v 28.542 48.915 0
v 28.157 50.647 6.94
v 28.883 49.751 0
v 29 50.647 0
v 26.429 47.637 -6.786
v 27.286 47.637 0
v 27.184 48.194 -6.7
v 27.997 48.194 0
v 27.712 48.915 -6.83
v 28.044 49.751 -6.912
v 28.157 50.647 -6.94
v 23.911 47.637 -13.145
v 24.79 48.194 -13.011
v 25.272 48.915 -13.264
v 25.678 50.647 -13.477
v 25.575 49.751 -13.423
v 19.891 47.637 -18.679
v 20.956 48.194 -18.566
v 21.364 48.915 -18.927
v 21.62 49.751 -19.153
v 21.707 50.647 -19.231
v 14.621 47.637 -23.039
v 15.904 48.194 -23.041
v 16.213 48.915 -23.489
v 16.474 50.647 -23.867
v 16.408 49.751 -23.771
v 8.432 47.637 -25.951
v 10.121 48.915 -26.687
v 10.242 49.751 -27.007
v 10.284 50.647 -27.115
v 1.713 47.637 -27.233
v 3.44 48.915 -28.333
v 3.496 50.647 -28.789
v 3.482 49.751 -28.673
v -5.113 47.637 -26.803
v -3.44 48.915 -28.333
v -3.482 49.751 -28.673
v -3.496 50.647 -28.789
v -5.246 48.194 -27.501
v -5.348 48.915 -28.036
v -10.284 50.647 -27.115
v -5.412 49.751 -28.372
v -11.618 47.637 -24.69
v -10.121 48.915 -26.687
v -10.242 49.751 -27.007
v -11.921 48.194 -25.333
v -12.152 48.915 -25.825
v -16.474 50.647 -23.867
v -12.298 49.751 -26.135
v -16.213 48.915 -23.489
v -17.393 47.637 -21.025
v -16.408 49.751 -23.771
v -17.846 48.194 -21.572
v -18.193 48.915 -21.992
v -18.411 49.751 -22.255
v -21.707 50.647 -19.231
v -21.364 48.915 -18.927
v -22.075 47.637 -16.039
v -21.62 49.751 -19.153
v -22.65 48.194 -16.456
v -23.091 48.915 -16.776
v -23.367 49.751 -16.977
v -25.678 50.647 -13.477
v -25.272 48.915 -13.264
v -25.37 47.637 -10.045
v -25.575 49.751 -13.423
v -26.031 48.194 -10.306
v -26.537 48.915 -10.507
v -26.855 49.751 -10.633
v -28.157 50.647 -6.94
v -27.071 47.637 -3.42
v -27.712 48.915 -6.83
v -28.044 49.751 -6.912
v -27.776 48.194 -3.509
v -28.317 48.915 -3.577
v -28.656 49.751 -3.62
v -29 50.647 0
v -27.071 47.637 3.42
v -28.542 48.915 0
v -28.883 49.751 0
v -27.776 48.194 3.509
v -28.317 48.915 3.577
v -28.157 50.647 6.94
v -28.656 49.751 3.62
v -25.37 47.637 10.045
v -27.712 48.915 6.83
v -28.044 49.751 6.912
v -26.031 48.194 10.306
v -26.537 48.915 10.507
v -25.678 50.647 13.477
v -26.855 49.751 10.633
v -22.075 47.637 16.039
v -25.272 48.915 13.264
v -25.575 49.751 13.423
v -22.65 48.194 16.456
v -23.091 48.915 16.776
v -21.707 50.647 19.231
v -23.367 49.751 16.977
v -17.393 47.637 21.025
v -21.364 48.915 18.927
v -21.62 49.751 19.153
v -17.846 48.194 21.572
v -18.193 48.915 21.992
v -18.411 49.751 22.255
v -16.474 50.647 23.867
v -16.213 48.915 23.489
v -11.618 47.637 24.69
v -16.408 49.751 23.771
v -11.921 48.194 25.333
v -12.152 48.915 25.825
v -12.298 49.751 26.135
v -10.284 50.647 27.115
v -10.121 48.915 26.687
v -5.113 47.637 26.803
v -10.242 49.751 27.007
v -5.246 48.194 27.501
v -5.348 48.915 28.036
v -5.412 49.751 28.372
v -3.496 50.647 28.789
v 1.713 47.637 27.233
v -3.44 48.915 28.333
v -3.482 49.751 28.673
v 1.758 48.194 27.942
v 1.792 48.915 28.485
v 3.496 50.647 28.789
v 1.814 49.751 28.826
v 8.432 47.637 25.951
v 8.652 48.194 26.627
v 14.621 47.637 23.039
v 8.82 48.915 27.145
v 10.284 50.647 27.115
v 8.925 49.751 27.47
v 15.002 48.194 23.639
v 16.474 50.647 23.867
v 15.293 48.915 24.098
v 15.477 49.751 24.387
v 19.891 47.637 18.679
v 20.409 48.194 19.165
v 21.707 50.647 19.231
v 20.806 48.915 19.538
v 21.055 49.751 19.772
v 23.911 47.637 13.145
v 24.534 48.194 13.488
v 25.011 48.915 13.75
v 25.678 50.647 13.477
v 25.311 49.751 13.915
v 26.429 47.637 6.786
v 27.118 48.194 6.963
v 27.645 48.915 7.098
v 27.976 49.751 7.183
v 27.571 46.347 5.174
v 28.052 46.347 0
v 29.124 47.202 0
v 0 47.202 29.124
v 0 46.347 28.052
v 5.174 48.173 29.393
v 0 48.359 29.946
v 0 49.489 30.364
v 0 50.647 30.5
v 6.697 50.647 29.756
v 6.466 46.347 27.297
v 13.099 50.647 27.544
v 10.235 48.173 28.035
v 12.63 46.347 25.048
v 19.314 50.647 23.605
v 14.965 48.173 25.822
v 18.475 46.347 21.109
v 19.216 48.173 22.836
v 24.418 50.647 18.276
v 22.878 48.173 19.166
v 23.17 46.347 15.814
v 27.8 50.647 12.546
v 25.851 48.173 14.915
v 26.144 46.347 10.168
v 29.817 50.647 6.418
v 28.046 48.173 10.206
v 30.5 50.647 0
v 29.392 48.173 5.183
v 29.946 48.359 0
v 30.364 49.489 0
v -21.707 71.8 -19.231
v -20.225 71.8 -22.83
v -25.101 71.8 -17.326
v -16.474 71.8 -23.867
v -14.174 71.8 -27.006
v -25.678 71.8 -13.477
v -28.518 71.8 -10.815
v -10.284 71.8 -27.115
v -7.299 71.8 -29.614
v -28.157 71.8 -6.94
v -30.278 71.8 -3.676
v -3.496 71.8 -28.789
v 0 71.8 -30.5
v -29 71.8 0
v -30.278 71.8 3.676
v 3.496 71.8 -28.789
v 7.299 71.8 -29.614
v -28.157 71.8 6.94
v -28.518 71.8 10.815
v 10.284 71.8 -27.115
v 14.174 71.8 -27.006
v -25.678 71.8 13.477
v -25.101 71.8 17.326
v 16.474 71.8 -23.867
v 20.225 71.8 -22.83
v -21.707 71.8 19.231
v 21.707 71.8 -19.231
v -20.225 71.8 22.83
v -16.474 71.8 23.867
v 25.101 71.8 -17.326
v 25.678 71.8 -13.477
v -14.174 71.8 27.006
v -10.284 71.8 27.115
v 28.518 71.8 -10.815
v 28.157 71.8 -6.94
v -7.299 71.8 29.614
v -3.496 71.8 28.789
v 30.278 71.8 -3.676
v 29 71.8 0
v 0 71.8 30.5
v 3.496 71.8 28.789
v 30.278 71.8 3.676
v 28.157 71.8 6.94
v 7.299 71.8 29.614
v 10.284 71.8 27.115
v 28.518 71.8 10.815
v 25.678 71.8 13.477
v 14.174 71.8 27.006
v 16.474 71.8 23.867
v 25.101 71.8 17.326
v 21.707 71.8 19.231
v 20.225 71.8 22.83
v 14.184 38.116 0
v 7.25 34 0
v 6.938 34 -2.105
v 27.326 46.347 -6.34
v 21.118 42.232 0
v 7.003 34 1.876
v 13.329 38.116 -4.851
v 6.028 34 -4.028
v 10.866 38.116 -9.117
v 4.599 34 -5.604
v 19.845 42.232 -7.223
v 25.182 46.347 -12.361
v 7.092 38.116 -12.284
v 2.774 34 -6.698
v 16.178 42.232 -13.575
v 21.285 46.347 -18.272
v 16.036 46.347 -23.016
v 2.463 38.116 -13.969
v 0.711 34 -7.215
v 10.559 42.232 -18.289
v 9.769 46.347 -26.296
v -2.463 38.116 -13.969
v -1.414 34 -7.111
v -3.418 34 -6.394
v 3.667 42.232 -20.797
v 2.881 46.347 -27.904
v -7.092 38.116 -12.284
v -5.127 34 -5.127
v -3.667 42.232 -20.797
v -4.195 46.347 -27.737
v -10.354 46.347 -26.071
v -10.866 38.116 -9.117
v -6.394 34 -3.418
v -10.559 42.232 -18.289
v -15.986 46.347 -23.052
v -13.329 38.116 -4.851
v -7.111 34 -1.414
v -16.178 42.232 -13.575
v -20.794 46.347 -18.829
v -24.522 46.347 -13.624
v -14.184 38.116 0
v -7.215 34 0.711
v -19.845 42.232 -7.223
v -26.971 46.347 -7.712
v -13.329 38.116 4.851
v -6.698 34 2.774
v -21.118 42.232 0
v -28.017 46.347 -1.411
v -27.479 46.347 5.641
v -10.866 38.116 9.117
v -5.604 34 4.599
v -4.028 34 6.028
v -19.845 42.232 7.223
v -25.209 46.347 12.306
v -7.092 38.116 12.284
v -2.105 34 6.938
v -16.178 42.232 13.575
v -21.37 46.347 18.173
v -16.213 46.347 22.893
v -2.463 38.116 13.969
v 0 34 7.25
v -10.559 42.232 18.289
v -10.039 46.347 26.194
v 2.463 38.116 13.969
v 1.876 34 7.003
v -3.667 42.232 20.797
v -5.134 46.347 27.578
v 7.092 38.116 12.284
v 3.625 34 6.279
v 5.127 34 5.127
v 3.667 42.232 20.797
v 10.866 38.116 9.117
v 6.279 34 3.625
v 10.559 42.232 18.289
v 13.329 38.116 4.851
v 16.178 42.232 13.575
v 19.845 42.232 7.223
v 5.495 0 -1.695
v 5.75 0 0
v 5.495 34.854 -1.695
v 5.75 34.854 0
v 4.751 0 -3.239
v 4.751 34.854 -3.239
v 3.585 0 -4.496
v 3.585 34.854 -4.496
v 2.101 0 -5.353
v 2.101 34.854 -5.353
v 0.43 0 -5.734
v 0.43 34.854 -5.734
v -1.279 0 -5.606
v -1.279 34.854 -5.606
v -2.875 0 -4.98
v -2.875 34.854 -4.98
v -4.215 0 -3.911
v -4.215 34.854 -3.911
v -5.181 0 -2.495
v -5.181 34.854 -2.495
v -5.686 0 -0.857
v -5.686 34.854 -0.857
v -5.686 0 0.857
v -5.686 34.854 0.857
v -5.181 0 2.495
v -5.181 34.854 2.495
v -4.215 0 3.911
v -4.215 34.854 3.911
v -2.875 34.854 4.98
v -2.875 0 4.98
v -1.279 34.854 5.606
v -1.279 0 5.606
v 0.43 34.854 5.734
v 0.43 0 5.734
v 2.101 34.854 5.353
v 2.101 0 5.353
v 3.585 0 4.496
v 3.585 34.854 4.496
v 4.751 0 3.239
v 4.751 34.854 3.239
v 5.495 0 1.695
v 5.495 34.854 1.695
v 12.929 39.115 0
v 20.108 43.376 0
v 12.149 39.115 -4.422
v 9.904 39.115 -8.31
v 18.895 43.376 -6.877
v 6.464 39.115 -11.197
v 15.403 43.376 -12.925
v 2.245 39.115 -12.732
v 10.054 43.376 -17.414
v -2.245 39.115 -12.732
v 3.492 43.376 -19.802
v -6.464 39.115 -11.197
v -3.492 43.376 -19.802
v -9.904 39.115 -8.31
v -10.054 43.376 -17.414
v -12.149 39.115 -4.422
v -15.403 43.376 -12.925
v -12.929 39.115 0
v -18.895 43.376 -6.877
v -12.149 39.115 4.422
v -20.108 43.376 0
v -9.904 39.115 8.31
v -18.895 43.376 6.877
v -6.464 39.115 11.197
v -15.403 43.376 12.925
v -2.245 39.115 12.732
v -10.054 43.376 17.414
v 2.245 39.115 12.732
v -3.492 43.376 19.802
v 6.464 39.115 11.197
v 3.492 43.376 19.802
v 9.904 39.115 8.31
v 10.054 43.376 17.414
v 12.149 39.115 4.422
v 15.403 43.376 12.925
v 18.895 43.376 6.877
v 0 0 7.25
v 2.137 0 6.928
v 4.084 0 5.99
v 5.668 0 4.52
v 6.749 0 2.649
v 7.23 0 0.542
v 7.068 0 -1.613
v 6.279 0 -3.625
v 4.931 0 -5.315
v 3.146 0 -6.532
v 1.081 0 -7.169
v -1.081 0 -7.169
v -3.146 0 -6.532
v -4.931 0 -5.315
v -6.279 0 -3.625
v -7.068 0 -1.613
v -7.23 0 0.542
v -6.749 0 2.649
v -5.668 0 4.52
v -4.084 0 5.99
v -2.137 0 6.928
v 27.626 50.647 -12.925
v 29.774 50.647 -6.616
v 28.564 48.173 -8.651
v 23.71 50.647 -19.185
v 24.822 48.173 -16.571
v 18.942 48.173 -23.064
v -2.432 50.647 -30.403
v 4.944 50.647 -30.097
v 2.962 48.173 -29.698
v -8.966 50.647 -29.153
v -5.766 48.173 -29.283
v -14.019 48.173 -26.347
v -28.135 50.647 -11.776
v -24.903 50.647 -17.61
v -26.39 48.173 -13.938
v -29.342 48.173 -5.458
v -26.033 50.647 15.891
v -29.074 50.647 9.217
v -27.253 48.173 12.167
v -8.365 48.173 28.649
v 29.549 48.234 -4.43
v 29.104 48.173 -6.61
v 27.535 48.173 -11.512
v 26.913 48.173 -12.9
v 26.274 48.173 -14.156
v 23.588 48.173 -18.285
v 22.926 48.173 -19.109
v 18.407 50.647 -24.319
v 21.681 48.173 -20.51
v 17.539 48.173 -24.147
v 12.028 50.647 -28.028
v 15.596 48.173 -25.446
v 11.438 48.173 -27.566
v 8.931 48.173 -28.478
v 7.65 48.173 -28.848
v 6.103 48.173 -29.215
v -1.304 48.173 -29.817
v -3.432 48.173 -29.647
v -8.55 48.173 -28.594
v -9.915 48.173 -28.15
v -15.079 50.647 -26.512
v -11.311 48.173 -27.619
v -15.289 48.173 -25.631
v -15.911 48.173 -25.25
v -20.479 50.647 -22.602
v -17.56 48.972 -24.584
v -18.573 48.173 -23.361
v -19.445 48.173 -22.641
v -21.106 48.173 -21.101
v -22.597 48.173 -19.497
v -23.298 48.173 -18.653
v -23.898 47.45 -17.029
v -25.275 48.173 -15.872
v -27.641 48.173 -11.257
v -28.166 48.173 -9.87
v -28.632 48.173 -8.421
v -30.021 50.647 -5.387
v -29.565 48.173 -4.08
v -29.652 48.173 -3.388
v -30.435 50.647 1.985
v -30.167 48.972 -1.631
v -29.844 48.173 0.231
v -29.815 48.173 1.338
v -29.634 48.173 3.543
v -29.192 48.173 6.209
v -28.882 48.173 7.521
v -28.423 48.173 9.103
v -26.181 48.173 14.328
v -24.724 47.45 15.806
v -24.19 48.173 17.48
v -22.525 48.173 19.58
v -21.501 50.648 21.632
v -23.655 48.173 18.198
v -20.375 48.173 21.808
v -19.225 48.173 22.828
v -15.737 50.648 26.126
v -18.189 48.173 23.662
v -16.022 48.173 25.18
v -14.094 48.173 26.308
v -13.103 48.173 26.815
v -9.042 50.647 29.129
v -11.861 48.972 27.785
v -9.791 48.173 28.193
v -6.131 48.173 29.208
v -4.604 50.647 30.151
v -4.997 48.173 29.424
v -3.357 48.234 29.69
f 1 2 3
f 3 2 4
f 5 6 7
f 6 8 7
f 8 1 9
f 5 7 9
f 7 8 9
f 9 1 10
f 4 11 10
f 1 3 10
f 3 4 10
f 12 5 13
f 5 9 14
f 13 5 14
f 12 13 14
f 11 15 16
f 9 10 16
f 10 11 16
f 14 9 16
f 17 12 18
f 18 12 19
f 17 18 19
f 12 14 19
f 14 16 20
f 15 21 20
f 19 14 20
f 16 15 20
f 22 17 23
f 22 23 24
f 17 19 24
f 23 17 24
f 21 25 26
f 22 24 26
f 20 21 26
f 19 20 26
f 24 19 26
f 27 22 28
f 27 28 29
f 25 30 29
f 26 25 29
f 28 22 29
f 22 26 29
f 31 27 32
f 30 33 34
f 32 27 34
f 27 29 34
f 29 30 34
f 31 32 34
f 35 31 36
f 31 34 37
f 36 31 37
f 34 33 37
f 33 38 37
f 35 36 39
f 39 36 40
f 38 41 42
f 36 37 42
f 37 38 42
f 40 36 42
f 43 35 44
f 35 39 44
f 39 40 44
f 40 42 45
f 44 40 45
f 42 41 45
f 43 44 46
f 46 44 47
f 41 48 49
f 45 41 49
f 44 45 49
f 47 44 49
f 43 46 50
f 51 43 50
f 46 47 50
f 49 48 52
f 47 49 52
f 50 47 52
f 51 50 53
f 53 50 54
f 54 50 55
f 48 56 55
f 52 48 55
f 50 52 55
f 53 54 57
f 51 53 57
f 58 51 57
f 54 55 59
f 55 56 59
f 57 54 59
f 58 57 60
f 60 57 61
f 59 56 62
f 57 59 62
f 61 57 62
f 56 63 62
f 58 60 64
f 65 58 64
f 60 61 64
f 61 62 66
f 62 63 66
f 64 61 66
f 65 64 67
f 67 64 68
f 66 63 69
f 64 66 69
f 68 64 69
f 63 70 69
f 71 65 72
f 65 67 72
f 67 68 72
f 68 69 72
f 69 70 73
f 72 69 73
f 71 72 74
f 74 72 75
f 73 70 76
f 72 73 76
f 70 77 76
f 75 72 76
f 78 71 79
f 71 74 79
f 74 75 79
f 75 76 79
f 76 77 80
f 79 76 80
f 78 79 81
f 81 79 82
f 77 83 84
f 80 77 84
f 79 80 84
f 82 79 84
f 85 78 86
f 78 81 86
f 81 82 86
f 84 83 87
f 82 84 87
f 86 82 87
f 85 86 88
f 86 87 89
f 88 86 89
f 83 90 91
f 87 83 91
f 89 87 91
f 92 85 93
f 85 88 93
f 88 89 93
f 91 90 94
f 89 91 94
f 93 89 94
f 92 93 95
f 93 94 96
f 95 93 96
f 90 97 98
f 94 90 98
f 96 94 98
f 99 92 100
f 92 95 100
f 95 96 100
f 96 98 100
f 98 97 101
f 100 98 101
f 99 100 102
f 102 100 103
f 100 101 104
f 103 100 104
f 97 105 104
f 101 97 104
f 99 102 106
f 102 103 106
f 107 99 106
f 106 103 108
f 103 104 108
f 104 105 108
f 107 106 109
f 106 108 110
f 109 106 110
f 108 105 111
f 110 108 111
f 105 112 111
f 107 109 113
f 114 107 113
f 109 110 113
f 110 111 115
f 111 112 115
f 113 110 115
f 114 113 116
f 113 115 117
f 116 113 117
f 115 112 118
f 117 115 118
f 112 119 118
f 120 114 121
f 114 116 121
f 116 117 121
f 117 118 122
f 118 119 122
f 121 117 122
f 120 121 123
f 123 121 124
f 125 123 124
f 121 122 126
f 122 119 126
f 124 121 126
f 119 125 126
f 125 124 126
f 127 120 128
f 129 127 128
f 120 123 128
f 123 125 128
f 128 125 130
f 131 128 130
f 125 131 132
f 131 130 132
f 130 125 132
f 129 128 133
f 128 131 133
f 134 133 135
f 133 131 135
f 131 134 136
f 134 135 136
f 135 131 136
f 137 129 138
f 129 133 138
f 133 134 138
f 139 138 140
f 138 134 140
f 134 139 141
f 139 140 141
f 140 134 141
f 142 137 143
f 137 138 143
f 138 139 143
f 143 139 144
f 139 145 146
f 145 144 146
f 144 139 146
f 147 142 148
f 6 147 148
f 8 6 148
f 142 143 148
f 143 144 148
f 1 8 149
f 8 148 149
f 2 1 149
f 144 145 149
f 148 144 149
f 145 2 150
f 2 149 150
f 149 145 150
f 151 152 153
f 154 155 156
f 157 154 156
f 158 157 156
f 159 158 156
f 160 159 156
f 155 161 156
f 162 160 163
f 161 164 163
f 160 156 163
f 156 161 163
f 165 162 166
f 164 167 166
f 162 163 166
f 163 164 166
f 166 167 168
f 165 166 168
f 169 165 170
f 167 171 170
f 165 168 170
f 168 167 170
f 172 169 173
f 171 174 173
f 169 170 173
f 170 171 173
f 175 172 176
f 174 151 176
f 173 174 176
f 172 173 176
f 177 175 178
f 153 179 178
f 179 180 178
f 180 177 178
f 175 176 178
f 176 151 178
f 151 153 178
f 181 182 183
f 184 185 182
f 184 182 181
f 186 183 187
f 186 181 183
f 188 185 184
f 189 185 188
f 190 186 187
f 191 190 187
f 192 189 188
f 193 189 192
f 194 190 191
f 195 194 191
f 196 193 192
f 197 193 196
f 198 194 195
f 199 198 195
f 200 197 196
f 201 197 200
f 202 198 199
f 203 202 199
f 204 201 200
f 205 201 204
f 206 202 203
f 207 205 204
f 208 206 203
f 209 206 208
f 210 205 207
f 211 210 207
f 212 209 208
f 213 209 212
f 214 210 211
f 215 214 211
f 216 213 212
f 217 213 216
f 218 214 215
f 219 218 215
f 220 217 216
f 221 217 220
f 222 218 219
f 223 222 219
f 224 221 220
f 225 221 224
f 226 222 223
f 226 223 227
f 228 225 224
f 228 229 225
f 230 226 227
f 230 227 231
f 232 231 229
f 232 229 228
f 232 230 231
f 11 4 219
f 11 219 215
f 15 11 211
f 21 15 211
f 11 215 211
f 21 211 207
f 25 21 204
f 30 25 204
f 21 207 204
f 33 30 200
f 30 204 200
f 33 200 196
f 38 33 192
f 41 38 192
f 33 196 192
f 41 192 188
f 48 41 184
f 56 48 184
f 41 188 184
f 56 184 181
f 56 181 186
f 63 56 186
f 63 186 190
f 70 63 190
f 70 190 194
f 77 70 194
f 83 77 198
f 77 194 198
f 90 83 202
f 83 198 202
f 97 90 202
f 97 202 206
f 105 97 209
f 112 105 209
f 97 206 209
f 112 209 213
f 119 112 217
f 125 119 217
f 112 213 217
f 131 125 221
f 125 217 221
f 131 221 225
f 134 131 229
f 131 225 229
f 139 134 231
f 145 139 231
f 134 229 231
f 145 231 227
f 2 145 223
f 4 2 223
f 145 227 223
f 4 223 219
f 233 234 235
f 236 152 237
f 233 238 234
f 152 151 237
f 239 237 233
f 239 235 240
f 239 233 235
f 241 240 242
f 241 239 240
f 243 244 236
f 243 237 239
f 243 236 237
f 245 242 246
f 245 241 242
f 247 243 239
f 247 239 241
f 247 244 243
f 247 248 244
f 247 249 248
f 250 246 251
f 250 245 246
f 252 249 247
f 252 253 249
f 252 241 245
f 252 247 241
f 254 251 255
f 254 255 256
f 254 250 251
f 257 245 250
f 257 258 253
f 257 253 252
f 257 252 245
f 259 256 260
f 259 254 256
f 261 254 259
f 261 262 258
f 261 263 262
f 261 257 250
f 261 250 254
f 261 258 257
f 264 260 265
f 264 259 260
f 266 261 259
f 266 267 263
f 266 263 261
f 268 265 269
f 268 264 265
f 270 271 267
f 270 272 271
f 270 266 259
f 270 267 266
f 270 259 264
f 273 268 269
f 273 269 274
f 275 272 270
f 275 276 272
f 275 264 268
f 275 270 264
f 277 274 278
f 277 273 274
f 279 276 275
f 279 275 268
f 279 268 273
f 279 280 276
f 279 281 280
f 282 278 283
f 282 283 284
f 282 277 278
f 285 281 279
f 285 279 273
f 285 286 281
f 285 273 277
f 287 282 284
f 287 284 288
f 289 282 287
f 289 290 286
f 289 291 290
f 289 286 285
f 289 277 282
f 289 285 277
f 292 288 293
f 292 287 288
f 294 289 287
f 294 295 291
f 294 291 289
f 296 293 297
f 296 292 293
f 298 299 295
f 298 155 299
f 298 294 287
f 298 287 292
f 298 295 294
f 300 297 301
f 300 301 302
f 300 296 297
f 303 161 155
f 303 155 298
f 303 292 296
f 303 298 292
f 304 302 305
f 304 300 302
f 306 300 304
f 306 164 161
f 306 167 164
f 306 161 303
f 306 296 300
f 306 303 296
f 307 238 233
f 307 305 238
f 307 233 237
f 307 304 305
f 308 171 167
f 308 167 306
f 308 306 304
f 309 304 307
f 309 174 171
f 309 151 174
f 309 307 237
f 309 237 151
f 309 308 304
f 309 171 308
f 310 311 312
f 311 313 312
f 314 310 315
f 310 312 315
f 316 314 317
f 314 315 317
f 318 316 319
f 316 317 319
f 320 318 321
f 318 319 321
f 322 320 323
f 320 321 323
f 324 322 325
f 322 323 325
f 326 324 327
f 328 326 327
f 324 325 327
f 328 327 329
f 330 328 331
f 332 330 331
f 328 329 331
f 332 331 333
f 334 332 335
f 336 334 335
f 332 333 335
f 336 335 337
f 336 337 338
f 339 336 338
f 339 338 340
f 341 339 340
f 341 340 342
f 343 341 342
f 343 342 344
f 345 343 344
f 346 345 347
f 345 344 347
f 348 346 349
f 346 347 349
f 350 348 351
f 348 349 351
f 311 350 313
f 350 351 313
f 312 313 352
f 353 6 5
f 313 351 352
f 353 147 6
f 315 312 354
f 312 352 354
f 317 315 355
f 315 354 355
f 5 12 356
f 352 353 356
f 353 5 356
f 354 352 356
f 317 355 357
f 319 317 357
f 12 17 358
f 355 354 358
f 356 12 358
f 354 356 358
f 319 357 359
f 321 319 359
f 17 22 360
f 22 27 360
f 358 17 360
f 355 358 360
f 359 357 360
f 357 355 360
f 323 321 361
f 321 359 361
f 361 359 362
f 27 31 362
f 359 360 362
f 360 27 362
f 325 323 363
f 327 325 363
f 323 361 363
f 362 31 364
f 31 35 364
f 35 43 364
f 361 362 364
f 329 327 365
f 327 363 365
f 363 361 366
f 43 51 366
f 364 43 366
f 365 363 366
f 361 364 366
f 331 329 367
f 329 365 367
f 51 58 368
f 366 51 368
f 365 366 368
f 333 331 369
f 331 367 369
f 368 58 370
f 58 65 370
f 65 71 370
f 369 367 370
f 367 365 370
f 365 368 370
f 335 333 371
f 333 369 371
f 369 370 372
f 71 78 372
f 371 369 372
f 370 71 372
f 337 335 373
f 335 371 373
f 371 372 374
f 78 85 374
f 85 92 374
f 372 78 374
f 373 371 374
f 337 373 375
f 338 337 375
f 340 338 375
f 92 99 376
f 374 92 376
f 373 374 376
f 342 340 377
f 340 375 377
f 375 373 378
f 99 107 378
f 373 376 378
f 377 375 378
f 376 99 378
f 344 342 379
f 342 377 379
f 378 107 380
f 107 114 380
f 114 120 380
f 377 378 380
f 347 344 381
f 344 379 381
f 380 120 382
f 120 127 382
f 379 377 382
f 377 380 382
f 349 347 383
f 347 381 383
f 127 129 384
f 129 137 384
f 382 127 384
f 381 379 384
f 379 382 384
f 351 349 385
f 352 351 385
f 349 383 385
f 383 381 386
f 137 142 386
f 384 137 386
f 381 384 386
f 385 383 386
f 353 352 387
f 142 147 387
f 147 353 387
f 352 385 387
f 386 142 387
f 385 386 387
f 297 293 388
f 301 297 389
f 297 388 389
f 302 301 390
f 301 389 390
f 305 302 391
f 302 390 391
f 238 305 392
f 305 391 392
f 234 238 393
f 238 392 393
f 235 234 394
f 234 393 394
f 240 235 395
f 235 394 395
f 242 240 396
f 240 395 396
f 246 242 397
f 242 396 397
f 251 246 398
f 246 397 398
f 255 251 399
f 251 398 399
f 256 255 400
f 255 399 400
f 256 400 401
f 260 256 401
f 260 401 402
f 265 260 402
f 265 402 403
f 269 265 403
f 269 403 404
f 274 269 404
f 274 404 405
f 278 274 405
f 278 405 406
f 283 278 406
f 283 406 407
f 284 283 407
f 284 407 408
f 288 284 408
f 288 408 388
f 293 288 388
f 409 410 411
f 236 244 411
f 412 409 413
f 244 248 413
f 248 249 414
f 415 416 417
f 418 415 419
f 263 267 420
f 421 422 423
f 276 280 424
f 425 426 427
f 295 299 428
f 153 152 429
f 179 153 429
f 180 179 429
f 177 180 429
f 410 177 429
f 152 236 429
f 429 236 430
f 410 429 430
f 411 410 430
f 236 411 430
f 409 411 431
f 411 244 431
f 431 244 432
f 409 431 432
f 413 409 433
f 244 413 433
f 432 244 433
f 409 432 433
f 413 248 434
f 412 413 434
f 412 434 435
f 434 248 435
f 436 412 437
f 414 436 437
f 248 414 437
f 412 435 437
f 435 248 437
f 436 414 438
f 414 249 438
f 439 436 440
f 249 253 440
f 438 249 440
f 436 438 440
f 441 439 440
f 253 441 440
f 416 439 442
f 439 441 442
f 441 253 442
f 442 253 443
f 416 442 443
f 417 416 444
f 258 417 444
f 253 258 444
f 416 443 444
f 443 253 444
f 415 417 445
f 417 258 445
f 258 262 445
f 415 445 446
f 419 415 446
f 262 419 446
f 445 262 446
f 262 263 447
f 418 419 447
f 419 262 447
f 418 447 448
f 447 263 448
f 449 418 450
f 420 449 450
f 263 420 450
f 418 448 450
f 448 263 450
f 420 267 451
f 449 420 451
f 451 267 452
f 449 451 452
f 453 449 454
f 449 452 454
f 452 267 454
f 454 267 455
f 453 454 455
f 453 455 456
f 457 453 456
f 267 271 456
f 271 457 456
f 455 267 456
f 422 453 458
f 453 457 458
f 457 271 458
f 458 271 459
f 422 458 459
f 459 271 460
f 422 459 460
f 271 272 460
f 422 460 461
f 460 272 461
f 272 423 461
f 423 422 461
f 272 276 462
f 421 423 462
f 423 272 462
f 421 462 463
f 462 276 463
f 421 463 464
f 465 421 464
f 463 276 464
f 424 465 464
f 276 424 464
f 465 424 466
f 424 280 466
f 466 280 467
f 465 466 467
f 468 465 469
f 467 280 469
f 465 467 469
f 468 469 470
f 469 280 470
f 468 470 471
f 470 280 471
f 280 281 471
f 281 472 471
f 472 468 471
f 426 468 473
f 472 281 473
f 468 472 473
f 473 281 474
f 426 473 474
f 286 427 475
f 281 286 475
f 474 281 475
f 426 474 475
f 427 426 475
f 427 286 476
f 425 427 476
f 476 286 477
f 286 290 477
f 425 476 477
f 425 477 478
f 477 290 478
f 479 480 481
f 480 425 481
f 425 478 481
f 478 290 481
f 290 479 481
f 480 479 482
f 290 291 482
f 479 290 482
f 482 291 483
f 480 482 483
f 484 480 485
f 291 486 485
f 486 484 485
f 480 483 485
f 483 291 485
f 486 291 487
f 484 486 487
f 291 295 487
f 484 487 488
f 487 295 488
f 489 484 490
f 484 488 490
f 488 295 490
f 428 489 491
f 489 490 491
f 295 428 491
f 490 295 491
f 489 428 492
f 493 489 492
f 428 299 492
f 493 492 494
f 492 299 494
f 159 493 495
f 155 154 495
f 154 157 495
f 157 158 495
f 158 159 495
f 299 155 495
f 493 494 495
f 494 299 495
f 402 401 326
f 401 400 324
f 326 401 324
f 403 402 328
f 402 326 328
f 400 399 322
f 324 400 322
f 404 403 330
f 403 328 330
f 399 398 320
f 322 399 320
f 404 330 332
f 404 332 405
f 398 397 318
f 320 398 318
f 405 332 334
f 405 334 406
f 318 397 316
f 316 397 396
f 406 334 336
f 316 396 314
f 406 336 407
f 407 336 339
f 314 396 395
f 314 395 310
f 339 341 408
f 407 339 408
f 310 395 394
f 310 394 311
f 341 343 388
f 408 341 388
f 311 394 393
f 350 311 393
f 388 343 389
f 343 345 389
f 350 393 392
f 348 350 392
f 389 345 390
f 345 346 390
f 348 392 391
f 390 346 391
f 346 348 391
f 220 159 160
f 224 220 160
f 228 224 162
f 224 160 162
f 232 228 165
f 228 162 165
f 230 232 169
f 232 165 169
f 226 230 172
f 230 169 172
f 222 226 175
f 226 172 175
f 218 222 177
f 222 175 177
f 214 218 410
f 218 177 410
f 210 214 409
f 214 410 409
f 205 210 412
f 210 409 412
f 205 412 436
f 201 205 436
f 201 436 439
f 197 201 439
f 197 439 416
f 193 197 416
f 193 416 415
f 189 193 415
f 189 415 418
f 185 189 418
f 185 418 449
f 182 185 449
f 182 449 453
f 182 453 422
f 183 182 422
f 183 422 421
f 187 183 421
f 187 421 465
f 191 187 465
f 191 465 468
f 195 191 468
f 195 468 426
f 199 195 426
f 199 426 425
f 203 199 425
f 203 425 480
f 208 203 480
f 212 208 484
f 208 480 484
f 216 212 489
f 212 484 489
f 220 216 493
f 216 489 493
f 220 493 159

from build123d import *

# Parameters (mm, degrees)
CROQUIS1_R              = 7.25
SALIENTE_EXTRUIR1_DEPTH = 34
CROQUIS2_R              = 30.5
SALIENTE_EXTRUIR2_DEPTH = 24
CROQUIS3_R              = 7.25
CROQUIS2_2_R            = 30.5
REDONDEO1_R             = 5
VACIADO1_T              = -1.5


with BuildPart() as part:
    # Croquis1 → Saliente-Extruir1 (new body)
    with BuildSketch(Plane(origin=(0, 0, 0), x_dir=(1, 0, 0), z_dir=(0, 1, 0))):
        Circle(CROQUIS1_R)
    extrude(amount=SALIENTE_EXTRUIR1_DEPTH)



with BuildPart() as body_2:
    # Croquis2 → Saliente-Extruir2 (new body)
    with BuildSketch(Plane(origin=(0, 47.8, 0), x_dir=(1, 0, 0), z_dir=(0, 1, 0))):
        Circle(CROQUIS2_R)
    extrude(amount=SALIENTE_EXTRUIR2_DEPTH)


with BuildPart() as part_1:
    add(part.part)

    add(body_2.part)  # Recubrir1 merges body 2
    # Croquis3 → Recubrir1 section 0
    with BuildSketch(Plane(origin=(0, 34, 0), x_dir=(1, 0, 0), z_dir=(0, 1, 0))):
        Circle(CROQUIS3_R)
    # Croquis2<2> → Recubrir1 section 1
    with BuildSketch(Plane(origin=(0, 47.8, 0), x_dir=(1, 0, 0), z_dir=(0, 1, 0))):
        Circle(CROQUIS2_2_R)
    loft()

    # Redondeo1
    redondeo1_edges = [part_1.edges().sort_by_distance(p)[0] for p in [
        (-30.5, 47.8, 0),
    ]]
    fillet(redondeo1_edges, radius=REDONDEO1_R)

    # Vaciado1
    vaciado1_openings = [part_1.faces().sort_by_distance(p)[0] for p in [
        (0, 0, 0),
        (0, 71.8, 0),
    ]]
    offset(amount=VACIADO1_T, openings=vaciado1_openings, kind=Kind.INTERSECTION)


solid = part_1.part
